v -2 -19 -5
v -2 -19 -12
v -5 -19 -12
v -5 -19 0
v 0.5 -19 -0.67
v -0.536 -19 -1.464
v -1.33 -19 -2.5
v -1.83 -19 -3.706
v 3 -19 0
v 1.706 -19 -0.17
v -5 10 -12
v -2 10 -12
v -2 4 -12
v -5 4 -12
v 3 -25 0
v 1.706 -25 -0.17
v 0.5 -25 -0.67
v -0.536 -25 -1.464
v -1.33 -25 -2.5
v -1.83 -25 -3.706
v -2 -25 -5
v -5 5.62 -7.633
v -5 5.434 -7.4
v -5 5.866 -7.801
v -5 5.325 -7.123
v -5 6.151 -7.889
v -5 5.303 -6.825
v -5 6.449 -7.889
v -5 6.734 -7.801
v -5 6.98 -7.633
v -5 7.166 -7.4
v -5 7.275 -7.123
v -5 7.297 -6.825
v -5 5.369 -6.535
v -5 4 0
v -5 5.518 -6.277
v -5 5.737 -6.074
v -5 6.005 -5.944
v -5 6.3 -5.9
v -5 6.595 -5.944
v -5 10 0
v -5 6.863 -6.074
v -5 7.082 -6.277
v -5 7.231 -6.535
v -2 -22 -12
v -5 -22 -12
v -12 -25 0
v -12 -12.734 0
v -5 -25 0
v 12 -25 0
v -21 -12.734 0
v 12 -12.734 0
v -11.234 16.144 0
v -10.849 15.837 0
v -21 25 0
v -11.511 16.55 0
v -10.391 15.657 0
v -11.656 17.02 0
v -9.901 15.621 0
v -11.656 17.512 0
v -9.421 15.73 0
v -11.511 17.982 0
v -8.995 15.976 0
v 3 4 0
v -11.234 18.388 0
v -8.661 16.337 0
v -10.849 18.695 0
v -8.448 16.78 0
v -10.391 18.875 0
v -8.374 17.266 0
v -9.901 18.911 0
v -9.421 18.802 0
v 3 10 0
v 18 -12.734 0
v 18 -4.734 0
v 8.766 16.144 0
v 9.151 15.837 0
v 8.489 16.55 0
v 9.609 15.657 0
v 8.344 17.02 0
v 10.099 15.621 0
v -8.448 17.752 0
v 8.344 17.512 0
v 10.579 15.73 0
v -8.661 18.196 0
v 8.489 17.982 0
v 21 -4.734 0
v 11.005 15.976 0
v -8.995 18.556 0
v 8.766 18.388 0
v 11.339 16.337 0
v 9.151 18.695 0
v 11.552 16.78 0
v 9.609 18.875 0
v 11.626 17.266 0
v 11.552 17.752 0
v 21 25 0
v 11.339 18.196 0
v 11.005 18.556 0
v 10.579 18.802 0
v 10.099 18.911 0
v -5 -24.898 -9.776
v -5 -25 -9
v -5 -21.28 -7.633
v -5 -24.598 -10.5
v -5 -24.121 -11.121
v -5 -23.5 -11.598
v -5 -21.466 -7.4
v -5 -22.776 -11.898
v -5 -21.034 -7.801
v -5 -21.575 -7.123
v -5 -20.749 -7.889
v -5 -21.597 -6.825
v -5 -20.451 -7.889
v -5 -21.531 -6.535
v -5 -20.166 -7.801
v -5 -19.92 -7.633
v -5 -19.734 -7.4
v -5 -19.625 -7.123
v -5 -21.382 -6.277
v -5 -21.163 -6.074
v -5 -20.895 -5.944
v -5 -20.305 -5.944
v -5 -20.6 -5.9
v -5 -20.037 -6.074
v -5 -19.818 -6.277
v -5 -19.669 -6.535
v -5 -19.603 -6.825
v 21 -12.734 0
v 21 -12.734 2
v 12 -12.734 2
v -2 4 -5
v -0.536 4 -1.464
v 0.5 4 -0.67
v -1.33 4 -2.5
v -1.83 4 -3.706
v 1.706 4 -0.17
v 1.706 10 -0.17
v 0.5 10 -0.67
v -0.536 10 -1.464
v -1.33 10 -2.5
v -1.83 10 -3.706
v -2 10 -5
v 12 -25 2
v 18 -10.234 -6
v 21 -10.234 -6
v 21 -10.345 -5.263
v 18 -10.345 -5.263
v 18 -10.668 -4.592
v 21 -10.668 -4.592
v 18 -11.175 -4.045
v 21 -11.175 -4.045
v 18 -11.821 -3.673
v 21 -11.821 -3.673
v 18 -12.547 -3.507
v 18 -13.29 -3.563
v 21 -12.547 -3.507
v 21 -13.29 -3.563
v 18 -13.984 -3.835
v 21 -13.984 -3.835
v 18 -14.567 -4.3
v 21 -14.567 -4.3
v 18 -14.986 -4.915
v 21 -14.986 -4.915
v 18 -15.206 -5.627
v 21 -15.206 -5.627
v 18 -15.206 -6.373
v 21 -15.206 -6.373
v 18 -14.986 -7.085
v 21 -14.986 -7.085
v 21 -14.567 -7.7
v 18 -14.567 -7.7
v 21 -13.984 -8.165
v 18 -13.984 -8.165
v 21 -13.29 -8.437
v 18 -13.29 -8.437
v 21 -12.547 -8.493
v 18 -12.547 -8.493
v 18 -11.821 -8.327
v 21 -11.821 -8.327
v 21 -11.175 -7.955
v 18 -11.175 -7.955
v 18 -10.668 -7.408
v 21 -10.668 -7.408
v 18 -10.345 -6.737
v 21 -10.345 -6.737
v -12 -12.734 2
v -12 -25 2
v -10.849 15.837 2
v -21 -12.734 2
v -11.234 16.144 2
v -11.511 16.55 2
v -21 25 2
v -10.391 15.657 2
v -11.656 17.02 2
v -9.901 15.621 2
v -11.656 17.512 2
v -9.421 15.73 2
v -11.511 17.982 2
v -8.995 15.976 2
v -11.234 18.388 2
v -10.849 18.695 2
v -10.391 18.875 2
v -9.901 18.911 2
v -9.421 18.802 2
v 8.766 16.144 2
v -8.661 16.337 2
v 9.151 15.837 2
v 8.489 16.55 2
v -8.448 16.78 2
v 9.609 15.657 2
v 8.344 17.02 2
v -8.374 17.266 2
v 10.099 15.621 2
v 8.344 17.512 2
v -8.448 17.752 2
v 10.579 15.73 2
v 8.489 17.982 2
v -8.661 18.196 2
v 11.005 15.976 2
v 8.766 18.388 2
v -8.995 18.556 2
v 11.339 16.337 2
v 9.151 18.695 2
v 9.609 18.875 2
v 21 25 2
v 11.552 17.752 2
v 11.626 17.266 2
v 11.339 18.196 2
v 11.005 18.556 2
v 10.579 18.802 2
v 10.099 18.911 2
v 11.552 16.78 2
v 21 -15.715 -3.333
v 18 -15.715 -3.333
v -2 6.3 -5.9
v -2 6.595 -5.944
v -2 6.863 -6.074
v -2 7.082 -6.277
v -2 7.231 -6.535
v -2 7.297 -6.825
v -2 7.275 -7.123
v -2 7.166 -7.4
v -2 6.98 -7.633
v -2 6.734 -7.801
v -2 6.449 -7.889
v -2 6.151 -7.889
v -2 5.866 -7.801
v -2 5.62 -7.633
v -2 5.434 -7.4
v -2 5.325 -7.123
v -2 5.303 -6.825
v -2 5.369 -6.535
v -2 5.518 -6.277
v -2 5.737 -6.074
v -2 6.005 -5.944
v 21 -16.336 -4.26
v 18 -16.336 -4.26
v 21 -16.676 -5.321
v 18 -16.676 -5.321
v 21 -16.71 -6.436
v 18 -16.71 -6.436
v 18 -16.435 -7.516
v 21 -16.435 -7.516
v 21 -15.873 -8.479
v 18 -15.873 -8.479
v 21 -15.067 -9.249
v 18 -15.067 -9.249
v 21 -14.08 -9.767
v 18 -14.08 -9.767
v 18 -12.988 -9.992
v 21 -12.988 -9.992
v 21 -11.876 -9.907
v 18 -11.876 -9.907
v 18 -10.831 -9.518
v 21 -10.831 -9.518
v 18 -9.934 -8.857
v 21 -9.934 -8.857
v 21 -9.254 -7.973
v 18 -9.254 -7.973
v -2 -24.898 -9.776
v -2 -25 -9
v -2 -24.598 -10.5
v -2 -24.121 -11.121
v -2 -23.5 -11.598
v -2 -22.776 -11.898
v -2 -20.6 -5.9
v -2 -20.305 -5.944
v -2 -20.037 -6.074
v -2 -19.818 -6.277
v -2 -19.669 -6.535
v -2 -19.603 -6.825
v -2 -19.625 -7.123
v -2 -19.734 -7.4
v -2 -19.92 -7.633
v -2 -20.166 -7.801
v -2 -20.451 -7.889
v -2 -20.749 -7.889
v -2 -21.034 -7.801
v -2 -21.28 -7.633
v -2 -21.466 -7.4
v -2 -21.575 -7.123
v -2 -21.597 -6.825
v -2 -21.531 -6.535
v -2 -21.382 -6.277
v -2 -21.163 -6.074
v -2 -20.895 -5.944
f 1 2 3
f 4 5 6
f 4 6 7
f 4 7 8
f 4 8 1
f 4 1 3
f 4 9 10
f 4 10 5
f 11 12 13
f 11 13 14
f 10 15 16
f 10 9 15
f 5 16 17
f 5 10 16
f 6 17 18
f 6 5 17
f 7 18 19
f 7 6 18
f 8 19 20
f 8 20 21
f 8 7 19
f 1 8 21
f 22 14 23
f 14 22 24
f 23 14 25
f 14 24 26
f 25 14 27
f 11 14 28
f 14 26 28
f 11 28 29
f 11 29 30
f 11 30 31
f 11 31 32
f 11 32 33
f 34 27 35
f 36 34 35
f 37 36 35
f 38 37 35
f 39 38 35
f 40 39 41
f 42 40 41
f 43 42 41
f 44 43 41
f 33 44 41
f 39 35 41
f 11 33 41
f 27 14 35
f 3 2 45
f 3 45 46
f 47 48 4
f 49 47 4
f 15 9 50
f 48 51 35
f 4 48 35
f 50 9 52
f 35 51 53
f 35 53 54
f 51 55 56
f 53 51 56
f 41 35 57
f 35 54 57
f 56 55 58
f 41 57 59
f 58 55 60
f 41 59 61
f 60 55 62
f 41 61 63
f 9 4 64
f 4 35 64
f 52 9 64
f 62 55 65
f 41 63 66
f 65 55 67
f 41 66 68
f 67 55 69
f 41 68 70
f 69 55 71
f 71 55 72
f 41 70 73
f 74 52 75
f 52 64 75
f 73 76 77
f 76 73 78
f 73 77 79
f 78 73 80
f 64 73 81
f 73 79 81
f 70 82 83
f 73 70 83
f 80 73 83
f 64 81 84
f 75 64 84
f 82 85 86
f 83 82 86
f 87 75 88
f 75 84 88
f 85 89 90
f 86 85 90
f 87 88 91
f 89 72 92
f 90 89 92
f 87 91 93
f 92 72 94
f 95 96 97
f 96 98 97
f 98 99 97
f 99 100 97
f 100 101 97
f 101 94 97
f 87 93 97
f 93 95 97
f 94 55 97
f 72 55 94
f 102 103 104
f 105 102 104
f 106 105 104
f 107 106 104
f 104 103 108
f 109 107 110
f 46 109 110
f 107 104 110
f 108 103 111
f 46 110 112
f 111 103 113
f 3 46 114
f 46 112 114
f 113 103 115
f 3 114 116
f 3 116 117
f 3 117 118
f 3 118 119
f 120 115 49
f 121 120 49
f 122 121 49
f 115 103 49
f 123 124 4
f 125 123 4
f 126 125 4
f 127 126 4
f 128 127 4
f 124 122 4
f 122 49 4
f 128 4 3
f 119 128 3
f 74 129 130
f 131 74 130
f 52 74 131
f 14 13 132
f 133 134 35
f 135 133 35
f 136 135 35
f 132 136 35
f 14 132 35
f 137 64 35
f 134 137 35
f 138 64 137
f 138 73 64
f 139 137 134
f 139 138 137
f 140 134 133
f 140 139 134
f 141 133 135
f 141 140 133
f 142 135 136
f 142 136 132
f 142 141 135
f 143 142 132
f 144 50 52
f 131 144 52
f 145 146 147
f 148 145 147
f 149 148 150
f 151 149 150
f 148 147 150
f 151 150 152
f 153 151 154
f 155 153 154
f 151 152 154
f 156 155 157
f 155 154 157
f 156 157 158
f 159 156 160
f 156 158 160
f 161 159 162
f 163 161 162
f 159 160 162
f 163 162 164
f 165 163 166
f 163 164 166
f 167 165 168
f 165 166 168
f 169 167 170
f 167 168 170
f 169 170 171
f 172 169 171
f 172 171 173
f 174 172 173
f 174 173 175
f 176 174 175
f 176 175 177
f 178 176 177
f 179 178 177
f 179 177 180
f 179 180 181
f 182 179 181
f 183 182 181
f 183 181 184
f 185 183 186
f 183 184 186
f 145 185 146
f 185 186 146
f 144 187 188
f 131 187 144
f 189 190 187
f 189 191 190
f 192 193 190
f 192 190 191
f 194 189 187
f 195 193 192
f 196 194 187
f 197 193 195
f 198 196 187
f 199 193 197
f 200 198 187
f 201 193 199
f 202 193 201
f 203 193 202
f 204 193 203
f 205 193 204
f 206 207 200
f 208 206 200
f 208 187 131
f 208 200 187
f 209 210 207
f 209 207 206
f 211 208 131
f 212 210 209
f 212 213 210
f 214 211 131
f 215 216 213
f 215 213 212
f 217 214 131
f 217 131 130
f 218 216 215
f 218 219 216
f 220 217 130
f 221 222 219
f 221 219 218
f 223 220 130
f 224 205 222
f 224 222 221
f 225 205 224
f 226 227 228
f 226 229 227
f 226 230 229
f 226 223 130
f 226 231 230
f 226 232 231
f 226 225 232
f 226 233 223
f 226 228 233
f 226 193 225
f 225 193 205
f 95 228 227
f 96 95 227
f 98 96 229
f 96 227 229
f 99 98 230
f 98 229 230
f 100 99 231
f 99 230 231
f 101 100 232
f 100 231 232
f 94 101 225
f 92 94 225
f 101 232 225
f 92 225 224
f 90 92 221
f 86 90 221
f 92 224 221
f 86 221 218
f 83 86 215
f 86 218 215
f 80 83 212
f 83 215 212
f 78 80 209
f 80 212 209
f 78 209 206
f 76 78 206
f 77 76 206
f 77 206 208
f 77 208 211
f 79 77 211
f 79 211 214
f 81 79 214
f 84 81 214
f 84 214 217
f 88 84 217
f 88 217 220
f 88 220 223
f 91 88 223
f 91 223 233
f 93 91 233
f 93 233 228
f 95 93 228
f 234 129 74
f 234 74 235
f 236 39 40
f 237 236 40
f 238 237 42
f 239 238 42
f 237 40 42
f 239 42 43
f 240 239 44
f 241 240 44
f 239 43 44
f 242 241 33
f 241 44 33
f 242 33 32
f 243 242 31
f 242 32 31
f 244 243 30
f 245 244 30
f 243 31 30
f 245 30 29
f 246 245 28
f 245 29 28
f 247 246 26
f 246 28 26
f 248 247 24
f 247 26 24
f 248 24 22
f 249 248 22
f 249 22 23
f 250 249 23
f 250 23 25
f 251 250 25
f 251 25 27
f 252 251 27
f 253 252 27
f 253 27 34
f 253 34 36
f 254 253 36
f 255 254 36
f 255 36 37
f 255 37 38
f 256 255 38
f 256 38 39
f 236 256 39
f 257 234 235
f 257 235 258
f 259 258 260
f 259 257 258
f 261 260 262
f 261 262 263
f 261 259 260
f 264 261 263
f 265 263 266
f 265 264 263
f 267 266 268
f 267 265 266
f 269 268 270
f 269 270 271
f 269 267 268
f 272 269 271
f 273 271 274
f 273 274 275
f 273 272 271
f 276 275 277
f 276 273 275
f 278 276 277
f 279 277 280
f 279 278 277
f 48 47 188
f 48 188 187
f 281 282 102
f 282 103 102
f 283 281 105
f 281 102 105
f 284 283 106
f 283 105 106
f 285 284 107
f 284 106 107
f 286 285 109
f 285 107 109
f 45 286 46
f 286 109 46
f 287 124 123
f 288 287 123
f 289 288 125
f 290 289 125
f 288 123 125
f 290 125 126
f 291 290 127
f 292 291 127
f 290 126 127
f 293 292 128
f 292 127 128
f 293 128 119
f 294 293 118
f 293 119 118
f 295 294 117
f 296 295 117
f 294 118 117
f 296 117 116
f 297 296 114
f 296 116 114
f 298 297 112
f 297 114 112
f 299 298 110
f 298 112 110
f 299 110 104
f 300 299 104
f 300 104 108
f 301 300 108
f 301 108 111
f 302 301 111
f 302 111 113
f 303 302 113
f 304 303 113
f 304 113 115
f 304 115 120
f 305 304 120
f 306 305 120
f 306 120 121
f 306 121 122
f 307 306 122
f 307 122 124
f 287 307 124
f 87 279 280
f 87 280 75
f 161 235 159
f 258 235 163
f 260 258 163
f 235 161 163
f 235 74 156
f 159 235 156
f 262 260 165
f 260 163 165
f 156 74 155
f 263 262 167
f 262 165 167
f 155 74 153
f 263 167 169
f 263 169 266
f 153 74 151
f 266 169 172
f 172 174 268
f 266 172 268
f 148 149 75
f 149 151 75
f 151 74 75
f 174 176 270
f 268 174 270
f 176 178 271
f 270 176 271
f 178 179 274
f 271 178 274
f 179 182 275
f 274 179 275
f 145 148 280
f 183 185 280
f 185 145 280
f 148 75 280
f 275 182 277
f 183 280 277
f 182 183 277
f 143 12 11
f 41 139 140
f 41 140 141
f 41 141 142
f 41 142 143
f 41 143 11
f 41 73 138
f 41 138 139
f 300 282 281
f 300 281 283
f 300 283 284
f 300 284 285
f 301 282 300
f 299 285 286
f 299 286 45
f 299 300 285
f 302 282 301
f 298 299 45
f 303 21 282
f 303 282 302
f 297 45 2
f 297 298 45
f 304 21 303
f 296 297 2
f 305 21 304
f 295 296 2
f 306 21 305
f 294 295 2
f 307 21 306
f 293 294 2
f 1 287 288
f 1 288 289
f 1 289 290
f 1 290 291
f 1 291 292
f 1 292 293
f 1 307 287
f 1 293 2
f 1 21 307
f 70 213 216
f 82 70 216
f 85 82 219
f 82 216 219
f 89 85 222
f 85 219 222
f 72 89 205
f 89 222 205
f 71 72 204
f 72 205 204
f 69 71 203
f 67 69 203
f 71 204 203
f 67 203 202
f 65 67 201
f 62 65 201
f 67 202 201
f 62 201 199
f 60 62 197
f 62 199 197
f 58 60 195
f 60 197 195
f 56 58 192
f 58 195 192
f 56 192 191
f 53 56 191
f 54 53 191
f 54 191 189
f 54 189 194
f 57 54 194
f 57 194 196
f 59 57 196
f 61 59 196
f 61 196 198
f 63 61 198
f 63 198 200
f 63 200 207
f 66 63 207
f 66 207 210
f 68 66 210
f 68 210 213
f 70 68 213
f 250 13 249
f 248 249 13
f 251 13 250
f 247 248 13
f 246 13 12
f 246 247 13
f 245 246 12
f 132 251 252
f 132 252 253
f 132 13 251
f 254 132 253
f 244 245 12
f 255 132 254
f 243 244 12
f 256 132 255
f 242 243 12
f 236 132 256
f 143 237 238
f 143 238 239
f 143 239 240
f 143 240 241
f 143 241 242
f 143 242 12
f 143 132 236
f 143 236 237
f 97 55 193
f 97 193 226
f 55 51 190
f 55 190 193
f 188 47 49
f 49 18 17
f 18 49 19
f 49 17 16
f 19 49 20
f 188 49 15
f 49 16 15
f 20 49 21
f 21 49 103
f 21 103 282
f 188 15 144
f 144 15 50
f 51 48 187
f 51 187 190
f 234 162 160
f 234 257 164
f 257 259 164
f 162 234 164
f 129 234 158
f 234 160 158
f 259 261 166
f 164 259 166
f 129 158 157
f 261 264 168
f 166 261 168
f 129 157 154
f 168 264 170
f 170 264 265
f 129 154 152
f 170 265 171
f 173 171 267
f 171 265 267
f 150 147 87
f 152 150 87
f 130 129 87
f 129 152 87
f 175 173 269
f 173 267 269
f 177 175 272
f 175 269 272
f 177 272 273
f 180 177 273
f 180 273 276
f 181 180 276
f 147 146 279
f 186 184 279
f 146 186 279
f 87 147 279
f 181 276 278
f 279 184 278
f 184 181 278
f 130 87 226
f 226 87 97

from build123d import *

# Parameters (mm, degrees)
SKETCH_1_W          = 42
SKETCH_1_H          = 50
EXTRUDE_1_DEPTH     = 2
SKETCH_3_W          = 3
SKETCH_3_H          = 6
EXTRUDE_2_DEPTH     = 12
FILLET_1_R          = 5
FILLET_2_R          = 5
SKETCH_4_R          = 1
CUT_EXTRUDE_1_DEPTH = 39.013155617
SKETCH_5_R          = 2.5
EXTRUDE_3_DEPTH     = 3
SKETCH_6_W          = 9
SKETCH_6_H          = 12.266046359
CUT_EXTRUDE_2_DEPTH = 35.785054262
SKETCH_7_R          = 1.65
CUT_EXTRUDE_3_DEPTH = 36.524639337
FILLET_3_R          = 3


with BuildPart() as part:
    # 草图1 → 凸台-拉伸1 (new body)
    with BuildSketch(Plane.XY):
        Rectangle(SKETCH_1_W, SKETCH_1_H)
    extrude(amount=EXTRUDE_1_DEPTH)

    # 草图3 → 凸台-拉伸2 (add)
    with BuildSketch(Plane(origin=(0, 0, 0), x_dir=(-1, 0, 0), z_dir=(0, 0, -1))):
        with Locations((3.5, -22)):
            Rectangle(SKETCH_3_W, SKETCH_3_H)
        with Locations((3.5, 7)):
            Rectangle(SKETCH_3_W, SKETCH_3_H)
    extrude(amount=EXTRUDE_2_DEPTH)

    # 圆角1
    fillet_1_edges = [part.edges().sort_by_distance(p)[0] for p in [
        (-2, 7, 0),
    ]]
    fillet(fillet_1_edges, radius=FILLET_1_R)

    # 圆角2
    fillet_2_edges = [part.edges().sort_by_distance(p)[0] for p in [
        (-2, -22, 0),
    ]]
    fillet(fillet_2_edges, radius=FILLET_2_R)

    # 草图4 → 切除-拉伸1 (cut, through all)
    with BuildSketch(Plane.ZY.offset(5)):
        with Locations((-6.9, -20.6)):
            Circle(SKETCH_4_R)
        with Locations((-6.9, 6.3)):
            Circle(SKETCH_4_R)
    extrude(amount=-CUT_EXTRUDE_1_DEPTH, mode=Mode.SUBTRACT)

    # 草图5 → 凸台-拉伸3 (add)
    with BuildSketch(Plane(origin=(21, 0, 0), x_dir=(0, 0, -1), z_dir=(1, 0, 0))):
        with BuildLine():
            Line((0, -4.733953641), (0, -12.733953641))
            Line((0, -12.733953641), (3.333333333, -15.715377611))
            ThreePointArc((3.333333333, -15.715377611), (9.249103106, -15.067047939), (7.972848445, -9.254317307))
            Line((7.972848445, -9.254317307), (0, -4.733953641))
        make_face()
        with Locations(Location((6, -12.733953641, 0), (0, 0, 90))):
            Circle(SKETCH_5_R, mode=Mode.SUBTRACT)
    extrude(amount=-EXTRUDE_3_DEPTH)

    # 草图6 → 切除-拉伸2 (cut, through all)
    with BuildSketch(Plane(origin=(0, 0, 0), x_dir=(-1, 0, 0), z_dir=(0, 0, -1))):
        with Locations((-16.5, -18.86697682)):
            Rectangle(SKETCH_6_W, SKETCH_6_H)
        with Locations((16.5, -18.86697682)):
            Rectangle(SKETCH_6_W, SKETCH_6_H)
    extrude(amount=-CUT_EXTRUDE_2_DEPTH, mode=Mode.SUBTRACT)

    # 草图7 → 切除-拉伸3 (cut, through all)
    with BuildSketch(Plane.XY.offset(2)):
        with Locations((9.975799492, 17.266046359)):
            Circle(SKETCH_7_R)
        with Locations((-10.024200508, 17.266046359)):
            Circle(SKETCH_7_R)
    extrude(amount=-CUT_EXTRUDE_3_DEPTH, mode=Mode.SUBTRACT)

    # 圆角3
    fillet_3_edges = [part.edges().sort_by_distance(p)[0] for p in [
        (-3.5, -25, -12),
    ]]
    fillet(fillet_3_edges, radius=FILLET_3_R)


solid = part.part
